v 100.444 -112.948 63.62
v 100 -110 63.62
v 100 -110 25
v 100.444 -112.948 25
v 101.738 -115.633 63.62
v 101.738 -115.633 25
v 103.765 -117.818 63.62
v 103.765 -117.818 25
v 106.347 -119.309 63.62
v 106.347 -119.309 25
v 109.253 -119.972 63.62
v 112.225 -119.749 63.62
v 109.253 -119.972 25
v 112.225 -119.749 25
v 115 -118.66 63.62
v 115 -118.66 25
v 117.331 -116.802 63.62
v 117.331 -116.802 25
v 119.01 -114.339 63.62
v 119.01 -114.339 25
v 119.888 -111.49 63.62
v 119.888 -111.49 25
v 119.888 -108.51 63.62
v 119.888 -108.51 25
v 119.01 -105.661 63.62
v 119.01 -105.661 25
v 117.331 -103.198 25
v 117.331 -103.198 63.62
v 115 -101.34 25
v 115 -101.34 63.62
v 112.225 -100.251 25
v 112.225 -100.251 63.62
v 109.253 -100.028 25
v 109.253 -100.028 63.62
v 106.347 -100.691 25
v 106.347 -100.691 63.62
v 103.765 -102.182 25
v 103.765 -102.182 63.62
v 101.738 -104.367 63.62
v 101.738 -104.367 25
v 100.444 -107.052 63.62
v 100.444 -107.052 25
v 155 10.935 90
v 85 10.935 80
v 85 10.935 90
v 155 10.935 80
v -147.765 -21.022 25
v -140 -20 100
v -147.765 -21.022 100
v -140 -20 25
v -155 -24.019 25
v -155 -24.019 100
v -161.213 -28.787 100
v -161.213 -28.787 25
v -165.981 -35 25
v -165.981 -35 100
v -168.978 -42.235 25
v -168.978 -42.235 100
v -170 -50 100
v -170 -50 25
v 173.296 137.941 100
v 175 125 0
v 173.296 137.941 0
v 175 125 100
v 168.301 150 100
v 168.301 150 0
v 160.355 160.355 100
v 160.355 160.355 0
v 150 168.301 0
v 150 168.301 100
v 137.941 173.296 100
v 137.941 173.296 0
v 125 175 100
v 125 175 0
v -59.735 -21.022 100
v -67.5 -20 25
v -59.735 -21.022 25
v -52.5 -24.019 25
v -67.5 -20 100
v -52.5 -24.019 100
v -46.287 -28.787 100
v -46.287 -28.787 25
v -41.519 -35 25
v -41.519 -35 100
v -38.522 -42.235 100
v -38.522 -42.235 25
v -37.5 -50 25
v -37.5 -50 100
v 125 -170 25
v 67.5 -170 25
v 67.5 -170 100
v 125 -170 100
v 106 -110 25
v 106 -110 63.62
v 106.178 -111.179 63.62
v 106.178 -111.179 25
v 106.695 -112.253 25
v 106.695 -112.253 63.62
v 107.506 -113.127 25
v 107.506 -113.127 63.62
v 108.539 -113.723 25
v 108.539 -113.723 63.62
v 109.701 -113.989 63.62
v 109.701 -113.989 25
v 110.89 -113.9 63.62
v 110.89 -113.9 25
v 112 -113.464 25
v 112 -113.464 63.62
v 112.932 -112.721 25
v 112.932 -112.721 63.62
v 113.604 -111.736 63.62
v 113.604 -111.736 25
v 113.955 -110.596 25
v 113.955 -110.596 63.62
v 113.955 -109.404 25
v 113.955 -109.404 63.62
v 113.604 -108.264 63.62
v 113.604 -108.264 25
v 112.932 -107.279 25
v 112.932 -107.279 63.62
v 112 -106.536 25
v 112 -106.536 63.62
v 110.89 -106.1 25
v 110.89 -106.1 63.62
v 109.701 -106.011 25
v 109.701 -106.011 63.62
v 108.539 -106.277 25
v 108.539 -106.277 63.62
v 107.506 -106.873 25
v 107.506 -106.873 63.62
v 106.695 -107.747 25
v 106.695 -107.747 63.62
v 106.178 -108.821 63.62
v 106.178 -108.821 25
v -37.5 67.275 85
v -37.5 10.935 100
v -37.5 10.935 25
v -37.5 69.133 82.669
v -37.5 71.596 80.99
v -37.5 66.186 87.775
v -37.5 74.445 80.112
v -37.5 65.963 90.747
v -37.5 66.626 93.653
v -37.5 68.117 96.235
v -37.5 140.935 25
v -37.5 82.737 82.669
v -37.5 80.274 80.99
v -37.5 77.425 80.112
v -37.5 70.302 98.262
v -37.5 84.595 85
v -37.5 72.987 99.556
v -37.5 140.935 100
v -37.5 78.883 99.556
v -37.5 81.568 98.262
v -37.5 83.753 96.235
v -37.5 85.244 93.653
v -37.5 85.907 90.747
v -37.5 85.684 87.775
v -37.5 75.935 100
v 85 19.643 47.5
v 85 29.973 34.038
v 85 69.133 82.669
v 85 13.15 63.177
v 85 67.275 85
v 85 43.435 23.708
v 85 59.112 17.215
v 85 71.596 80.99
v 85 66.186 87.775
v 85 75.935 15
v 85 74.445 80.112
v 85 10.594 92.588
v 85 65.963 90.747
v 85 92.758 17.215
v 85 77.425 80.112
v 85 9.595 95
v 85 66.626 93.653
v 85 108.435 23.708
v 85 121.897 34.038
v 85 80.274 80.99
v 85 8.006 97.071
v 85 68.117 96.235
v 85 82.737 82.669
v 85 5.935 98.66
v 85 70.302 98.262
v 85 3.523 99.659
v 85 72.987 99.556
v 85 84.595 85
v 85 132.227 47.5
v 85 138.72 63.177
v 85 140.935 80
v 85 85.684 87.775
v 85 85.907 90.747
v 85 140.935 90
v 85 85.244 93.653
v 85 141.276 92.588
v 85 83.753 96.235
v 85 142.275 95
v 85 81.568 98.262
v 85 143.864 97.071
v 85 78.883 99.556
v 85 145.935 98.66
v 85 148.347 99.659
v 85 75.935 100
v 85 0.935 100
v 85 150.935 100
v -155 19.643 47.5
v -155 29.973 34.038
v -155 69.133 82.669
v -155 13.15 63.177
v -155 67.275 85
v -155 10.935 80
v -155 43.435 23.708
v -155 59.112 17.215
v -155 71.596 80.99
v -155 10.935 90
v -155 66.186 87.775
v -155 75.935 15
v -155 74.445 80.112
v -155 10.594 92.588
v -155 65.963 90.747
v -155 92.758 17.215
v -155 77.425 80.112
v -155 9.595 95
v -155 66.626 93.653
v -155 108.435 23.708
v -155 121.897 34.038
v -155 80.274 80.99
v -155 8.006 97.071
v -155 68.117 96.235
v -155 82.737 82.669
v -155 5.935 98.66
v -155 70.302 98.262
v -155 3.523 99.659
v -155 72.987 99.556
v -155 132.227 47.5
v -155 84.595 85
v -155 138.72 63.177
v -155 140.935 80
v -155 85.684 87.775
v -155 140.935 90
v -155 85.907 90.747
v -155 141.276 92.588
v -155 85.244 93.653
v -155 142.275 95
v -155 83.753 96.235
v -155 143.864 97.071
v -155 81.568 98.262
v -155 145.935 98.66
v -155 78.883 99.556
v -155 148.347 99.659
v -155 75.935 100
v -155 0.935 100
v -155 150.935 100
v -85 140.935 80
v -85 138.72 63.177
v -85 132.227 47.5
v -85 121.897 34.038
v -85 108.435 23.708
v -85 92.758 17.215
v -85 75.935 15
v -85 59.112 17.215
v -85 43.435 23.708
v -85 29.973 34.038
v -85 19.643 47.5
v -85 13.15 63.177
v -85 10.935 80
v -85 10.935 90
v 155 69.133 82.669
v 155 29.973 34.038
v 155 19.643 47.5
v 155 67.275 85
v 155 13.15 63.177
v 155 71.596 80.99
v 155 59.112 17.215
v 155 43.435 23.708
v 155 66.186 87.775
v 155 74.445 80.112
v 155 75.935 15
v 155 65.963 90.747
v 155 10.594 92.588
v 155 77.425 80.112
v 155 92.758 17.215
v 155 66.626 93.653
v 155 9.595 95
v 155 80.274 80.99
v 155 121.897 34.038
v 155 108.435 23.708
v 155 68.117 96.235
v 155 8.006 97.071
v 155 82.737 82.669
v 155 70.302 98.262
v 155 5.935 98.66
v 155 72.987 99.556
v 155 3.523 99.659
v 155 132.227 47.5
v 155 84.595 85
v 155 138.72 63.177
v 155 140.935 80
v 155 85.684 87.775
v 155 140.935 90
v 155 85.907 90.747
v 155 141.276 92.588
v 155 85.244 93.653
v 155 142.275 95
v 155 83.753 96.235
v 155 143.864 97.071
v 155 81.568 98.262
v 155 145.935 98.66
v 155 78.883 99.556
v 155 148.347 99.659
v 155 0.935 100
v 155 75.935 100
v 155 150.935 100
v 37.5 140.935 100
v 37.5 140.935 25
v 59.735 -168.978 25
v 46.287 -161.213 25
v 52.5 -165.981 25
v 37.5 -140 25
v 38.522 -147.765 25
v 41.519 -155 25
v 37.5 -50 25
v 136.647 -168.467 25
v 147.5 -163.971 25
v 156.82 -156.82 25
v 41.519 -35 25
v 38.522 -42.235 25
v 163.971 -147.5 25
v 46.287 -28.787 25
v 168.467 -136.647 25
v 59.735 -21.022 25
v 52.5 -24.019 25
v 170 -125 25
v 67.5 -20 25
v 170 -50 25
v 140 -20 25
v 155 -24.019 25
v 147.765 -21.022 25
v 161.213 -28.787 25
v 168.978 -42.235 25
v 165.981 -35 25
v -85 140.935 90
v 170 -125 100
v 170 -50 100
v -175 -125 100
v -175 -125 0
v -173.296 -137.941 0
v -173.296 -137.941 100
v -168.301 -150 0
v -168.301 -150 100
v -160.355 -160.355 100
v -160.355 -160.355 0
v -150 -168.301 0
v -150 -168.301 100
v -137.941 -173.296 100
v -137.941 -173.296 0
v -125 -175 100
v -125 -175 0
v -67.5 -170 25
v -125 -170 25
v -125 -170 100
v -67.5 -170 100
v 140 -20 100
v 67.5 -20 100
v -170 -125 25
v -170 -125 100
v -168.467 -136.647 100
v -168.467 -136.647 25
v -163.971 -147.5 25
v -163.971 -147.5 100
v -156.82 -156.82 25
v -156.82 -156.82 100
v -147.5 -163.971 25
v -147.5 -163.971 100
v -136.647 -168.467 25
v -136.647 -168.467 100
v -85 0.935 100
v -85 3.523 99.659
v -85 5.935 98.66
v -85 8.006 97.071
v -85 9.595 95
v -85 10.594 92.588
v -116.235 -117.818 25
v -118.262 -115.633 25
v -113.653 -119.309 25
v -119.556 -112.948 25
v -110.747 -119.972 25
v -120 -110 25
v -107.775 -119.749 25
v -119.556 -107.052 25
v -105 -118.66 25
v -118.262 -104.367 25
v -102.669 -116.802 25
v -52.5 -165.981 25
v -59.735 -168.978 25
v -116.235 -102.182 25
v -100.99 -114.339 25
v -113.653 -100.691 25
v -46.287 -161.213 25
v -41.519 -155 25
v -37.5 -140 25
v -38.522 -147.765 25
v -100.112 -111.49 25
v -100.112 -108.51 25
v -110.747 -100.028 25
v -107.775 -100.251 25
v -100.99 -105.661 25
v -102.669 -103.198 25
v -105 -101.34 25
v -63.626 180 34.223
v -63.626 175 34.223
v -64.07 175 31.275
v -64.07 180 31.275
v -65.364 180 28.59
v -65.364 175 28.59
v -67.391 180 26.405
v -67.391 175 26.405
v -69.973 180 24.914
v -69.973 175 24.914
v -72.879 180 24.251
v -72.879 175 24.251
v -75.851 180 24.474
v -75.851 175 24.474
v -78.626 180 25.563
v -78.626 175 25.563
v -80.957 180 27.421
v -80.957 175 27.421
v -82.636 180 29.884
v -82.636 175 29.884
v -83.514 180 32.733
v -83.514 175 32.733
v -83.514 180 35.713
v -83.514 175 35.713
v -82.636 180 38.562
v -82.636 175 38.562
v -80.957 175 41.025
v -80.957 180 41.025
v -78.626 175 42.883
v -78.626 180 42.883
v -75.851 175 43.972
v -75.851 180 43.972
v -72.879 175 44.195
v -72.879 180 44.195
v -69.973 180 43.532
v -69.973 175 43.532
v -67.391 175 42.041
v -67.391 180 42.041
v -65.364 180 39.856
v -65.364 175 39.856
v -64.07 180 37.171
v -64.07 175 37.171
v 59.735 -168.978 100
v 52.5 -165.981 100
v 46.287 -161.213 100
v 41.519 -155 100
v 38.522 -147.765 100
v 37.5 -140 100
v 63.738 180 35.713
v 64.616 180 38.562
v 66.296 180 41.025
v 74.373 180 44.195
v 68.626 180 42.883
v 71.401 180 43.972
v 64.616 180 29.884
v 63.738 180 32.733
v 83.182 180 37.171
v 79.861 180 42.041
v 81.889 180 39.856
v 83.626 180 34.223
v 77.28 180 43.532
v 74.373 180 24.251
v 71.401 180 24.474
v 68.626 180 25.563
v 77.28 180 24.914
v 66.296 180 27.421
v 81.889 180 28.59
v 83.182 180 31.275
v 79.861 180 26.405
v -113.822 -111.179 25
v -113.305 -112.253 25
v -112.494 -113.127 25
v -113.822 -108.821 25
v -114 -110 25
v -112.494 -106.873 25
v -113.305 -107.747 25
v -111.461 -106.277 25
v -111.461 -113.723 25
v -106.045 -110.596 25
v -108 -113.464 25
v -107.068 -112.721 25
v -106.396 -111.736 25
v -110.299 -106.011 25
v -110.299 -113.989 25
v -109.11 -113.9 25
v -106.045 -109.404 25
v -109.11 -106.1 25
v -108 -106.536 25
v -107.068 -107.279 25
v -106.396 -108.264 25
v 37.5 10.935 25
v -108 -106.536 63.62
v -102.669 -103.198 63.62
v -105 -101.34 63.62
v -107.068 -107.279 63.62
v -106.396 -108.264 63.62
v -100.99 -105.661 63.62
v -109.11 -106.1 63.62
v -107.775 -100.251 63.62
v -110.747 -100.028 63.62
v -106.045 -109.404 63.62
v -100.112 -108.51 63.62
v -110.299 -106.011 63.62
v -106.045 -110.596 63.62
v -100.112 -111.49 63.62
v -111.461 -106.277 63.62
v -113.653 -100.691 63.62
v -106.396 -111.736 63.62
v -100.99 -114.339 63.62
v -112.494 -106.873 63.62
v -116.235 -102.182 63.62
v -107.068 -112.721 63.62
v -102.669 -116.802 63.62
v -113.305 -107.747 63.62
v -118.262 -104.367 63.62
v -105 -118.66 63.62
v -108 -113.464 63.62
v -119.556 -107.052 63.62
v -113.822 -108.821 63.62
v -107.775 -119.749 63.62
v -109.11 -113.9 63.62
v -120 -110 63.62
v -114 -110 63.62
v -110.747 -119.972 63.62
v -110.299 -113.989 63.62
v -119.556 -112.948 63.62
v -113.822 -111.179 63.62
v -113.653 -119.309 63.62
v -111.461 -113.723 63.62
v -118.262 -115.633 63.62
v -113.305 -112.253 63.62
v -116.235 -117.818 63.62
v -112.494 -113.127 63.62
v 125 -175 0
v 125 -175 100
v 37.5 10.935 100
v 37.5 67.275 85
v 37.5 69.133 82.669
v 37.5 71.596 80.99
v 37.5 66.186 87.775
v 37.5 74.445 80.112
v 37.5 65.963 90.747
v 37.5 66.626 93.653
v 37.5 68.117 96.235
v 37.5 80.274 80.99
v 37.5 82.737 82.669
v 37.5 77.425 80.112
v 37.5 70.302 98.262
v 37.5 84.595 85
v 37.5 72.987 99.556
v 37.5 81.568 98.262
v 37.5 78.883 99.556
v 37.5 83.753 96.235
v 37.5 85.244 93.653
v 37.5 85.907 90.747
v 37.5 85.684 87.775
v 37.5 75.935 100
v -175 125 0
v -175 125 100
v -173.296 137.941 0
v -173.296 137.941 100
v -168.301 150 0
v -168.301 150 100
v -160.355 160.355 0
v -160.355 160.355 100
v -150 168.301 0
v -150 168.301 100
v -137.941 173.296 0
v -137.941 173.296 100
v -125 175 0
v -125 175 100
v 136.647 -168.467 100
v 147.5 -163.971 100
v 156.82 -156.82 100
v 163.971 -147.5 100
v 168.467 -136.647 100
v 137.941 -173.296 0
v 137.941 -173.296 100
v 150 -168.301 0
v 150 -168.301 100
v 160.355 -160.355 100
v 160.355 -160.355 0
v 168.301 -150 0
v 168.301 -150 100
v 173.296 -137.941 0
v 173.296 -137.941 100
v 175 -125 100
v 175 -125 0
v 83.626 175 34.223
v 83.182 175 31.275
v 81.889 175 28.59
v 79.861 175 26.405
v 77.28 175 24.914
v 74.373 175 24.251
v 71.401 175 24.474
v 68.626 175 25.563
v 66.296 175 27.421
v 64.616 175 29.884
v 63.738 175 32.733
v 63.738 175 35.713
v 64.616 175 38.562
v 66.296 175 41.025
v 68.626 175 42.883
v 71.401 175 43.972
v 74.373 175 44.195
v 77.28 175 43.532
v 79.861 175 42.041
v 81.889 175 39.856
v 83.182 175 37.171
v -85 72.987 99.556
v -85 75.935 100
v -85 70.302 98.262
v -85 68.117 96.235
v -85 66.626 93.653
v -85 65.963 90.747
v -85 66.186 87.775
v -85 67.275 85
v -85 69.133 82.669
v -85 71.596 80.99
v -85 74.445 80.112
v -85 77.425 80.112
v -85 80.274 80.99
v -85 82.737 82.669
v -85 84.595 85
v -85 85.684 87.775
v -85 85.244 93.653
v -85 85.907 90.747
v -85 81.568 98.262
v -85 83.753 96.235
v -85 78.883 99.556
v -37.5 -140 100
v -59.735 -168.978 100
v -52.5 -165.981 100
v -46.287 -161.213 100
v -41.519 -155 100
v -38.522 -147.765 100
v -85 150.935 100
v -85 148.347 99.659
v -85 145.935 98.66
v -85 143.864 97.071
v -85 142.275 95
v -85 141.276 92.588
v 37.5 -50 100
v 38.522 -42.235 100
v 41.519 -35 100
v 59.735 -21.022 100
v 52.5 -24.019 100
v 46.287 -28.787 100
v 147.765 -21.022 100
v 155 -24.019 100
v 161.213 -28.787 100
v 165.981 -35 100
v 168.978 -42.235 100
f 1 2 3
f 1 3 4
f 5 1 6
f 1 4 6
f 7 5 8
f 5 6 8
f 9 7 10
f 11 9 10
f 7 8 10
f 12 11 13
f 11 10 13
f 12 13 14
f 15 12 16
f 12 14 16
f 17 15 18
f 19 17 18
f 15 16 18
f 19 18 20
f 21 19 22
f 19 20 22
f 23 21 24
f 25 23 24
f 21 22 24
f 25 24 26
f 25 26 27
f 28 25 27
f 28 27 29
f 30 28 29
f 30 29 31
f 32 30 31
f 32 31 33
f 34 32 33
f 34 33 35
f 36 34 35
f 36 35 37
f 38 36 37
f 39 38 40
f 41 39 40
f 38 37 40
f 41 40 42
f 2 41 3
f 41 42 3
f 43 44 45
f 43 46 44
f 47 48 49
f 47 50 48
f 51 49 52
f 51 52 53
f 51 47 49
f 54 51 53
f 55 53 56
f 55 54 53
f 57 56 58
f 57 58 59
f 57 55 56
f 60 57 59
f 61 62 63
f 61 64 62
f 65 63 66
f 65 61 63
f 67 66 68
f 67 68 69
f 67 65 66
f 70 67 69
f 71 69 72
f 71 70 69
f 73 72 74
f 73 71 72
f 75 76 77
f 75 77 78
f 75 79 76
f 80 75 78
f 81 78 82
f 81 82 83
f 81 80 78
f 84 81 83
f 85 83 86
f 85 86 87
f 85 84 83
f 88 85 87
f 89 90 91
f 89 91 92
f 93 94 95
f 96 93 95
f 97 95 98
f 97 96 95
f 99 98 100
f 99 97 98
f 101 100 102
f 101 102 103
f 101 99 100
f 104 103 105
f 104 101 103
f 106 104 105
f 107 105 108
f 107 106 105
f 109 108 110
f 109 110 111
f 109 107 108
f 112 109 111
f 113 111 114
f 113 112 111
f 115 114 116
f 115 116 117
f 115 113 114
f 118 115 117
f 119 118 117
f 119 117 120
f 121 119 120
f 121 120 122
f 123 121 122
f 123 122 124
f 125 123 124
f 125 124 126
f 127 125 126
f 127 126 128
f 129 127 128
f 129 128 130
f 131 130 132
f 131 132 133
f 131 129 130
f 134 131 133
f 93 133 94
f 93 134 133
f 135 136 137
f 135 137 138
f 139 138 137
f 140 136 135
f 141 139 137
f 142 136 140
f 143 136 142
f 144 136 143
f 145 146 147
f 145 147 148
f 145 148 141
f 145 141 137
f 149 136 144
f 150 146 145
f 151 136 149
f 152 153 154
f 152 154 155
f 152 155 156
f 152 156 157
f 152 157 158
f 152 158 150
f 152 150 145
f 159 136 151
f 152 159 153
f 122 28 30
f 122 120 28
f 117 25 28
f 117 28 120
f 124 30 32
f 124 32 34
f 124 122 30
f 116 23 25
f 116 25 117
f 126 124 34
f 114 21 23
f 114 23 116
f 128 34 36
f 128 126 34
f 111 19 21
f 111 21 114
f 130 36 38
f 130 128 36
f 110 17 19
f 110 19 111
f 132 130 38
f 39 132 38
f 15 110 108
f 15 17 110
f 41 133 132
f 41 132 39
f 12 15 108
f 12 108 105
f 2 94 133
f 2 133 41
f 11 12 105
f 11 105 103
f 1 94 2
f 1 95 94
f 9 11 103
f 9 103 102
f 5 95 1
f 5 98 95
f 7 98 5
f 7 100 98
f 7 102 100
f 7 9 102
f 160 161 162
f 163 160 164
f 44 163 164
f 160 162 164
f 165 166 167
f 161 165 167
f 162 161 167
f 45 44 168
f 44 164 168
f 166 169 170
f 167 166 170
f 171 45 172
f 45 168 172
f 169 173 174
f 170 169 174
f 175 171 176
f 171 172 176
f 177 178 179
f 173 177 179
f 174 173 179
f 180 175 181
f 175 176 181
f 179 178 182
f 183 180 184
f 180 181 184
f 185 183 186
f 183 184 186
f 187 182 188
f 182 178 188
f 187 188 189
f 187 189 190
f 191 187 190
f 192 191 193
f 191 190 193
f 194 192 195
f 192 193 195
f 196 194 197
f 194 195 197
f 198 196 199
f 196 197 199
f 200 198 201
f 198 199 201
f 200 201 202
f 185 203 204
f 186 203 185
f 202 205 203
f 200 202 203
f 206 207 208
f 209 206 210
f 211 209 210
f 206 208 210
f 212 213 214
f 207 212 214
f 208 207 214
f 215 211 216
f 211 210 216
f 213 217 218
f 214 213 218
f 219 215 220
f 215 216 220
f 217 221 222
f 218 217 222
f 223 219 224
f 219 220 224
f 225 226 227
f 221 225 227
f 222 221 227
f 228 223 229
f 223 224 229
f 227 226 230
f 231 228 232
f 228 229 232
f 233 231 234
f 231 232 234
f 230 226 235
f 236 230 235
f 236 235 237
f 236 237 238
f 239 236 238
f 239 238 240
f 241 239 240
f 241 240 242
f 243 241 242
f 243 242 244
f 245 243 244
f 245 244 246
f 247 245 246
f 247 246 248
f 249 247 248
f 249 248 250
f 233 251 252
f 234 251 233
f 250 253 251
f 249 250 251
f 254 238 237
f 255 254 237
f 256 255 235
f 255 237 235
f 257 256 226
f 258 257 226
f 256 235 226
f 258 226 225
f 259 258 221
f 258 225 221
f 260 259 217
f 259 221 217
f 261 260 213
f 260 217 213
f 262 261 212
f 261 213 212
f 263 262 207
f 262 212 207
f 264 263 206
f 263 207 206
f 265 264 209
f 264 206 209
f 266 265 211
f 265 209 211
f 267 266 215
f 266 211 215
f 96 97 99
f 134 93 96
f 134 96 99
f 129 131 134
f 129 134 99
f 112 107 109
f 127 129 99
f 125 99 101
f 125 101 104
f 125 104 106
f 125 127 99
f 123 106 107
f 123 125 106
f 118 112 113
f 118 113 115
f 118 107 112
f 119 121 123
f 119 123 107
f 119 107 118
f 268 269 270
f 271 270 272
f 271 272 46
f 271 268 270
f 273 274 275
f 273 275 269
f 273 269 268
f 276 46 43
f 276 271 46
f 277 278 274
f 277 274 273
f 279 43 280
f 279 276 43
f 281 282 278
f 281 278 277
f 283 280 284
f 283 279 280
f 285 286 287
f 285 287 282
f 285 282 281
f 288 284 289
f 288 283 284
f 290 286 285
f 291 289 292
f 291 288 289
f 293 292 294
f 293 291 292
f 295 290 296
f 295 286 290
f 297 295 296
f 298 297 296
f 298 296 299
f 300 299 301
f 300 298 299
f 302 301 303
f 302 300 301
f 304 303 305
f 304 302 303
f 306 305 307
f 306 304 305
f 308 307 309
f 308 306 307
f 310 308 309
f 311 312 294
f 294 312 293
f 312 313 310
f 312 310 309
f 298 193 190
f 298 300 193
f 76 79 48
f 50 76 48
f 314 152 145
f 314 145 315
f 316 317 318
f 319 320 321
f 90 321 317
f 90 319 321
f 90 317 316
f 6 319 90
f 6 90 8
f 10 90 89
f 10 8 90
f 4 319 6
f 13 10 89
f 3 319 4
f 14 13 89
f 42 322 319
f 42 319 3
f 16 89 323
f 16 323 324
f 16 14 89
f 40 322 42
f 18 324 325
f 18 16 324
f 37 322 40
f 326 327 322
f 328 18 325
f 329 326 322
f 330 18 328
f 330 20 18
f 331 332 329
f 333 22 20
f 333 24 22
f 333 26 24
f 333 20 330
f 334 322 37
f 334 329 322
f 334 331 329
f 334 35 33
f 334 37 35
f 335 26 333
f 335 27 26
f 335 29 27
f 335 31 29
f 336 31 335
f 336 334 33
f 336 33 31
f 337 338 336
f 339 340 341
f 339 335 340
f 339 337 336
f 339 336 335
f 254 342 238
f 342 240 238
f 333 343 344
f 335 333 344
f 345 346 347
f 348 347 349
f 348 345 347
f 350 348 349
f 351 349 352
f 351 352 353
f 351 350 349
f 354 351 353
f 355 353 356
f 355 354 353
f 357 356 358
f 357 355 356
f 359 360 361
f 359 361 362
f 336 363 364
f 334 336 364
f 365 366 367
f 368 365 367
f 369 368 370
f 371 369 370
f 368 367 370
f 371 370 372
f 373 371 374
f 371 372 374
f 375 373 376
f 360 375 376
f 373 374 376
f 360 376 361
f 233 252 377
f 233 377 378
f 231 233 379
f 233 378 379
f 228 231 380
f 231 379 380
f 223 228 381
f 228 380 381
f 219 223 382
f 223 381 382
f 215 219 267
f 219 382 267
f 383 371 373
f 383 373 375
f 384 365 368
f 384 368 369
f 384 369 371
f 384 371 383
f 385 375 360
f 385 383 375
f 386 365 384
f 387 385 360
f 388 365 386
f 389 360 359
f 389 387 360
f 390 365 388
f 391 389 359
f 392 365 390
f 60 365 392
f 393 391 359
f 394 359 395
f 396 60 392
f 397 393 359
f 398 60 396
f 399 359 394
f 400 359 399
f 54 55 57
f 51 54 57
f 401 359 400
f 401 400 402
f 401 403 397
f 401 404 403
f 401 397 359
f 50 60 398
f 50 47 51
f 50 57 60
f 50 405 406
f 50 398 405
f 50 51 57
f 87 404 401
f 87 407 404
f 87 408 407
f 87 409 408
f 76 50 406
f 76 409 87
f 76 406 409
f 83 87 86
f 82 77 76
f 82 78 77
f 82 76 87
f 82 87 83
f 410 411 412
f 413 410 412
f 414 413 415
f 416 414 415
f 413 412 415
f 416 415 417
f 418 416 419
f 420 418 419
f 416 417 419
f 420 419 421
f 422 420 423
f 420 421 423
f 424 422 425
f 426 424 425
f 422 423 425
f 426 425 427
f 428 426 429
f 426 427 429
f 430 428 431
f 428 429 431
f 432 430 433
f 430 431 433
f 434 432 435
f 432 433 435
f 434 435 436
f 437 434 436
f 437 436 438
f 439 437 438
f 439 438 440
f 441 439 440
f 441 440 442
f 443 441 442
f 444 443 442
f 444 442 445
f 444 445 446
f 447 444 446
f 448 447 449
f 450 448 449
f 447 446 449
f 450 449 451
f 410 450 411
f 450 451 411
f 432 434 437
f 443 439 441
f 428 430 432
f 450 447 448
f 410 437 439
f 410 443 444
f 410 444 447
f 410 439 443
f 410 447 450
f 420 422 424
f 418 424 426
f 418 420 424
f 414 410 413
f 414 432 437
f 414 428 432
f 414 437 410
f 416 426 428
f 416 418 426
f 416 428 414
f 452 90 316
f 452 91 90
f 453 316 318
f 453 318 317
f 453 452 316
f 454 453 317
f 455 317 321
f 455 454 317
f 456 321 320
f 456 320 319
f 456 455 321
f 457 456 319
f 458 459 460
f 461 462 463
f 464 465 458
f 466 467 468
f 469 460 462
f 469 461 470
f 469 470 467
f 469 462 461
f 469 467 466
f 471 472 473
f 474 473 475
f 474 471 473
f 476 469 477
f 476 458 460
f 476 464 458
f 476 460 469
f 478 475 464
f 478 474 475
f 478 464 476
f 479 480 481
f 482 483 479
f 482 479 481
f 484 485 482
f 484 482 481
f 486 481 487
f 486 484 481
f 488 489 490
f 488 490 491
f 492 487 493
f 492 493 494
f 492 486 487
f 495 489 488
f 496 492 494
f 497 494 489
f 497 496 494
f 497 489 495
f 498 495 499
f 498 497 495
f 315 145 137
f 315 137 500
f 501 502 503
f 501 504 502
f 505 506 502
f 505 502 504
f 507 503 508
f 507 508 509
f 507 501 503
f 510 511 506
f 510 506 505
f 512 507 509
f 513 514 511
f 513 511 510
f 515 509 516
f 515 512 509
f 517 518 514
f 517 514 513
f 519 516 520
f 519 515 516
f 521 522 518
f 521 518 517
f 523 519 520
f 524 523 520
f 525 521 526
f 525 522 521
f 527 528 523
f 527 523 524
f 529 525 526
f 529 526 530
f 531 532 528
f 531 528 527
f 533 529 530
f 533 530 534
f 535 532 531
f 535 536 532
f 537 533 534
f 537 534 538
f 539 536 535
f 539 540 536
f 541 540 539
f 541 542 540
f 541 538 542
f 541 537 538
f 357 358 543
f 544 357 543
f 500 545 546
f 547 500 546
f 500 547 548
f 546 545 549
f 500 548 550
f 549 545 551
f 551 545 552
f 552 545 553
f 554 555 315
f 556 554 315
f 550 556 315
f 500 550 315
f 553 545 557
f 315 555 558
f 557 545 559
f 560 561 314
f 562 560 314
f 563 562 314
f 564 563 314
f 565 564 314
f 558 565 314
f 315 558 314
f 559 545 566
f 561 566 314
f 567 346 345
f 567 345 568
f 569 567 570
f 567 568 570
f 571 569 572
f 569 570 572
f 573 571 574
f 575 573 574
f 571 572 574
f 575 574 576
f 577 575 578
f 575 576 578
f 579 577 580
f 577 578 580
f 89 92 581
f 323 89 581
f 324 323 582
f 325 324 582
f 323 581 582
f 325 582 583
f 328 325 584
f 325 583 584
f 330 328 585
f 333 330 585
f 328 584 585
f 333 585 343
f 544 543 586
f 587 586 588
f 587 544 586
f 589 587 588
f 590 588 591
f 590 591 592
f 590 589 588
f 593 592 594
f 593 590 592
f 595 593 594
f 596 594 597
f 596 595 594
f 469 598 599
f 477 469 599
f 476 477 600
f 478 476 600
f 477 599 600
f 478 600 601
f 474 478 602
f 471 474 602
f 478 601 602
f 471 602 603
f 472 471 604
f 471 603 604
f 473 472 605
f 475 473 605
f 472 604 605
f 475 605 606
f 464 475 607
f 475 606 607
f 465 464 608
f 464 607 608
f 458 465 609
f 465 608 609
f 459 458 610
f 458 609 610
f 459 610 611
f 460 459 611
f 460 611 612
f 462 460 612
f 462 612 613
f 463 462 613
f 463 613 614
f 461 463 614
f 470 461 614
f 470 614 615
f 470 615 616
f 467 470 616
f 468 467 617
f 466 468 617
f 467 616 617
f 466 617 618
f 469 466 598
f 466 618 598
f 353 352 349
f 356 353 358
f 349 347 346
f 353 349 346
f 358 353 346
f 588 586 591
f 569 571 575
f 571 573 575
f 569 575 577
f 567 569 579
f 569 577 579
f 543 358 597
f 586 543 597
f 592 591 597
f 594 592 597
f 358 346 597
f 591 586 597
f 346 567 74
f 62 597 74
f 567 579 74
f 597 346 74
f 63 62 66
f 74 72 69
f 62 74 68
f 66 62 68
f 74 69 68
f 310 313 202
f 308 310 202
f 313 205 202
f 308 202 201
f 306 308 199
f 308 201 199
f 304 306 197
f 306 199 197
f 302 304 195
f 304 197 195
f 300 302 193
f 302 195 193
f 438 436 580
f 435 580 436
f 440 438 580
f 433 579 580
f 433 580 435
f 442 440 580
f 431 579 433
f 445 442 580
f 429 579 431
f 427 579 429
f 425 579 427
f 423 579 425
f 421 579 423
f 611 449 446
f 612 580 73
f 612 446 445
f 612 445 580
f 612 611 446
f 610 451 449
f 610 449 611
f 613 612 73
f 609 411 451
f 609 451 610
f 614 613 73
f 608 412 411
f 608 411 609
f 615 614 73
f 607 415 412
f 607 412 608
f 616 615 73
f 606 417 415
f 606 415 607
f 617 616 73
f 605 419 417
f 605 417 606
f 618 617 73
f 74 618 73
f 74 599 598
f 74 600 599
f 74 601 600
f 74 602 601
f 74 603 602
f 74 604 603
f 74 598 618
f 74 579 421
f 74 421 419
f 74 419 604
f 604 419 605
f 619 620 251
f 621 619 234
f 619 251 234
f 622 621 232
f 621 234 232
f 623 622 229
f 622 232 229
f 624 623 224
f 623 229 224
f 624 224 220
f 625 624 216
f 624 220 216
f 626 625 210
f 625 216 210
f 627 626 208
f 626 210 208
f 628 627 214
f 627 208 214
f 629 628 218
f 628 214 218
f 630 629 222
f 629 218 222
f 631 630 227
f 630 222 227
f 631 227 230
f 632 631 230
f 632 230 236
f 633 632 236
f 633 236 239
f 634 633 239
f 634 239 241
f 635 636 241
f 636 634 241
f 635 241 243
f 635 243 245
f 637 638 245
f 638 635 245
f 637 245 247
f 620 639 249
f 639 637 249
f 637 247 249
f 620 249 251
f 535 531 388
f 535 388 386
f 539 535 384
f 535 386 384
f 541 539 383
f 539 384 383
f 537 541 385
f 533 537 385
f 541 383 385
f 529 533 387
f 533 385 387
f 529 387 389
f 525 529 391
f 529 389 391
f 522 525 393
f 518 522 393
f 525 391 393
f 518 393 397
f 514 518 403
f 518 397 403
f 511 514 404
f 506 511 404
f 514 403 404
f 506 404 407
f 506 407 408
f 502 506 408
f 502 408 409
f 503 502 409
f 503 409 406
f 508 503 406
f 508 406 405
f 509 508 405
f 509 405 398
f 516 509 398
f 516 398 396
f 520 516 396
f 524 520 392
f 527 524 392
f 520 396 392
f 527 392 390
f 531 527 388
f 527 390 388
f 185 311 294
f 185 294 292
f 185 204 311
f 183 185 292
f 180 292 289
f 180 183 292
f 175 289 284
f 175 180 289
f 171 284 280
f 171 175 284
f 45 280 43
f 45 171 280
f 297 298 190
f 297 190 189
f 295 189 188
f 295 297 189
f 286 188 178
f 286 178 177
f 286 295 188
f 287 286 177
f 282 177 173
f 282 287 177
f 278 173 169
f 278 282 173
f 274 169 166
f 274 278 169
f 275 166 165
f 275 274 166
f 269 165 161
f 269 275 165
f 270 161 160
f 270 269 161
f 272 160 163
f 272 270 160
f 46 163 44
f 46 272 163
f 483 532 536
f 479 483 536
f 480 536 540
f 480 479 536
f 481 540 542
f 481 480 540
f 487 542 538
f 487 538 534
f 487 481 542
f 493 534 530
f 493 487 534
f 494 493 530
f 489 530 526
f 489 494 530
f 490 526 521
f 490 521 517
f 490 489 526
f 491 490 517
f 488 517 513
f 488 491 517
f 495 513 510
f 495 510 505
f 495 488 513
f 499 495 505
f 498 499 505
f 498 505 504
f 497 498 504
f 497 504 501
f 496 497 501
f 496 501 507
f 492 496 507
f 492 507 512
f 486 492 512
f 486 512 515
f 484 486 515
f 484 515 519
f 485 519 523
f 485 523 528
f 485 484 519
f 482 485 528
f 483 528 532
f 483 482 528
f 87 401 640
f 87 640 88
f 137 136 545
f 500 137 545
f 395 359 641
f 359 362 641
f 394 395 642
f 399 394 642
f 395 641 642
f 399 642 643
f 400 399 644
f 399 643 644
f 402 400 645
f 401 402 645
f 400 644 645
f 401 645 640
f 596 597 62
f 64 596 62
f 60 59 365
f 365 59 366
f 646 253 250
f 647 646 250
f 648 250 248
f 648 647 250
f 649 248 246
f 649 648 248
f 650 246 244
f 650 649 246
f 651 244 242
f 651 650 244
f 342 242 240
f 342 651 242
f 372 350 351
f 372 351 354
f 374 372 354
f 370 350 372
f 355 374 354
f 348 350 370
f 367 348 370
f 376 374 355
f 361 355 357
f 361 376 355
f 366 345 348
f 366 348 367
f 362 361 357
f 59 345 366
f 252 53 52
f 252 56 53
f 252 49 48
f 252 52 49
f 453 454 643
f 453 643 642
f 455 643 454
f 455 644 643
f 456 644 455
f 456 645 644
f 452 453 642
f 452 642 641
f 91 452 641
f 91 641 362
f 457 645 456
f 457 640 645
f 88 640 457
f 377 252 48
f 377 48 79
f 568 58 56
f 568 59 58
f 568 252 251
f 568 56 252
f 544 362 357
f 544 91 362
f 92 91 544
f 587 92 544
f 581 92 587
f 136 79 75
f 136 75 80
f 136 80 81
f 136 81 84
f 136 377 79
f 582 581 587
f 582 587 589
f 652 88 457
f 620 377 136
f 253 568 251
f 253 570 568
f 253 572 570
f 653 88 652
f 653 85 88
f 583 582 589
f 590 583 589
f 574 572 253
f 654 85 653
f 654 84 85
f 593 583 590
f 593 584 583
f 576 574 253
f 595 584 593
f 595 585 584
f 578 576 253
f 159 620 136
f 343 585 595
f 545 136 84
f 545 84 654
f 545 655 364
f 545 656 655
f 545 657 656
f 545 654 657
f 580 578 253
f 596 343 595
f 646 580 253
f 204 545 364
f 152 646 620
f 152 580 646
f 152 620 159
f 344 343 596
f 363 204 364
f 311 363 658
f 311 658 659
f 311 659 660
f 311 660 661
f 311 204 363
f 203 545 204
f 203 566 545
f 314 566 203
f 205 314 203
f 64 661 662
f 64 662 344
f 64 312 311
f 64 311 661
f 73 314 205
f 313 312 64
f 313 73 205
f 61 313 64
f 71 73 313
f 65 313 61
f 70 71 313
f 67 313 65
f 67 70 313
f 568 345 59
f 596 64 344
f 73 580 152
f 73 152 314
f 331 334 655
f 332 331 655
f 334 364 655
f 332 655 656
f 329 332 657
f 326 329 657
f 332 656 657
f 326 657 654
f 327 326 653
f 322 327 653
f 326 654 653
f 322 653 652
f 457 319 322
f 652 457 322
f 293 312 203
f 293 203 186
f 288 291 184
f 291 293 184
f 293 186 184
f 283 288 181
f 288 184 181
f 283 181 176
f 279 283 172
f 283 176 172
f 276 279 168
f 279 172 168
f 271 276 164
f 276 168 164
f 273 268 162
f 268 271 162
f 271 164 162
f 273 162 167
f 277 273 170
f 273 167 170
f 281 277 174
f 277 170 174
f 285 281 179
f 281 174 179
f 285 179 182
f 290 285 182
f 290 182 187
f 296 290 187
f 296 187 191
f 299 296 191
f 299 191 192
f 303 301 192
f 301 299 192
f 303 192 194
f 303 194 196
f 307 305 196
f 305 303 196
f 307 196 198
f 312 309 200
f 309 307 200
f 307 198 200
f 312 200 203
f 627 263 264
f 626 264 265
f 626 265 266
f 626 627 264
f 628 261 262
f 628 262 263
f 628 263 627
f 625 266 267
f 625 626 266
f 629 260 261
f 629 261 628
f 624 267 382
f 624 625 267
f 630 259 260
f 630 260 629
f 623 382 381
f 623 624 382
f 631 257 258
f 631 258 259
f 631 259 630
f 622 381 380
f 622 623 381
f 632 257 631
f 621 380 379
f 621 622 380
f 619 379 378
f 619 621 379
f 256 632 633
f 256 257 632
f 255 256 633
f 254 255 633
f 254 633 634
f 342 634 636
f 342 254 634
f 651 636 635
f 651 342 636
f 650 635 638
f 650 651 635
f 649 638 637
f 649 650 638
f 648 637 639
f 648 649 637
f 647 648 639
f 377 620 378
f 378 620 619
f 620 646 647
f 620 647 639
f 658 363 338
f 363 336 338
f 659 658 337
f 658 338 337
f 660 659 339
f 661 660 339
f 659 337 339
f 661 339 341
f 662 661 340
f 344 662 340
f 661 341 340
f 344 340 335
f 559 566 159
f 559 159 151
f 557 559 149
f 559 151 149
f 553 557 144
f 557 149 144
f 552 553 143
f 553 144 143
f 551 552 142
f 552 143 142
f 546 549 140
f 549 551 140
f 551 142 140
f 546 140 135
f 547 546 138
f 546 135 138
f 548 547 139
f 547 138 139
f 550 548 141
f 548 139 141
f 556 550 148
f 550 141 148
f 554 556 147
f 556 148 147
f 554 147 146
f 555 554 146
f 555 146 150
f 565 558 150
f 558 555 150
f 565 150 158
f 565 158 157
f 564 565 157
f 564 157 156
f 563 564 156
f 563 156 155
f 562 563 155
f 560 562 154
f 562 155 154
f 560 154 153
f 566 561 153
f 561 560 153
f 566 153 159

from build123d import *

# Parameters (mm, degrees)
SKETCH_1_W          = 350
SKETCH_1_H          = 350
EXTRUDE_1_DEPTH     = 100
FILLET_1_R          = 50
CUT_EXTRUDE_1_DEPTH = 35
SKETCH_4_W          = 75
SKETCH_4_H          = 130
CUT_EXTRUDE_2_DEPTH = 75
EXTRUDE_3_REACH     = 388.685
SKETCH_5_R          = 10
FILLET_2_R          = 10
CUT_EXTRUDE_3_DEPTH = 75
SKETCH_7_R          = 10
SKETCH_7_R_2        = 4
EXTRUDE_4_DEPTH     = 38.62
SKETCH_8_W          = 75
SKETCH_8_H          = 150
EXTRUDE_5_DEPTH     = 75
FILLET_3_R          = 30
SKETCH_9_R          = 10
EXTRUDE_6_DEPTH     = 5


with BuildPart() as part:
    # 草图1 → 凸台-拉伸1 (new body)
    with BuildSketch(Plane.XY):
        Rectangle(SKETCH_1_W, SKETCH_1_H)
    extrude(amount=EXTRUDE_1_DEPTH)

    # 圆角1
    fillet_1_edges = [part.edges().sort_by_distance(p)[0] for p in [
        (-175, 175, 50),
        (175, 175, 50),
        (175, -175, 50),
        (-175, -175, 50),
    ]]
    fillet(fillet_1_edges, radius=FILLET_1_R)

    # 草图3 → 切除-拉伸1 (cut, symmetric)
    with BuildSketch(Plane.ZY.offset(120)):
        with BuildLine():
            Line((15, 75.934955472), (100, 75.934955472))
            Line((100, 75.934955472), (100, 140.934955472))
            Line((100, 140.934955472), (80, 140.934955472))
            ThreePointArc((80, 140.934955472), (34.038059223, 121.896896249), (15, 75.934955472))
        make_face()
        with BuildLine():
            Line((100, 10.934955472), (100, 75.934955472))
            Line((100, 75.934955472), (15, 75.934955472))
            ThreePointArc((15, 75.934955472), (34.038059223, 29.973014695), (80, 10.934955472))
            Line((80, 10.934955472), (100, 10.934955472))
        make_face()
    cut_extrude_1 = extrude(amount=CUT_EXTRUDE_1_DEPTH, both=True, mode=Mode.SUBTRACT)

    # 镜向1: 切除-拉伸1 across plane
    add(cut_extrude_1.mirror(Plane(origin=(0, 0, 0), x_dir=(0, 0, 1), z_dir=(1, 0, 0))), mode=Mode.SUBTRACT)

    # 草图4 → 切除-拉伸2 (cut)
    with BuildSketch(Plane.XY.offset(100)):
        with Locations((0, 75.934955472)):
            Rectangle(SKETCH_4_W, SKETCH_4_H)
    extrude(amount=-CUT_EXTRUDE_2_DEPTH, mode=Mode.SUBTRACT)

    # 凸台-拉伸3: up to this face of the body (flat: up to its plane)
    extrude_3_end = Plane(part.part.faces().sort_by_distance((155, 75.934955472, 62.993408065))[0])
    # 草图5 → 凸台-拉伸3 (add, up to the picked face)
    with BuildSketch(Plane(origin=(-155, 0, 0), x_dir=(0, 0, -1), z_dir=(1, 0, 0)), mode=Mode.PRIVATE) as extrude_3_sk1:
        with Locations(Location((-90, 75.934955472, 0), (0, 0, 180))):
            Circle(SKETCH_5_R)
    extrude_3_tool1 = split(extrude(extrude_3_sk1.sketch, amount=EXTRUDE_3_REACH, mode=Mode.PRIVATE), bisect_by=extrude_3_end, keep=Keep.BOTH, mode=Mode.PRIVATE)
    add(extrude_3_tool1.solids().sort_by(Axis((-155, 75.934955, 90), (1, 0, 0)))[0])

    # 圆角2
    fillet_2_edges = [part.edges().sort_by_distance(p)[0] for p in [
        (-120, 10.934955472, 100),
        (-120, 140.934955472, 100),
        (120, 140.934955472, 100),
        (120, 10.934955472, 100),
    ]]
    fillet(fillet_2_edges, radius=FILLET_2_R)

    # 草图6 → 切除-拉伸3 (cut)
    with BuildSketch(Plane.XY.offset(100)):
        with BuildLine():
            Line((170, -20), (0, -20))
            Line((0, -20), (0, -170))
            Line((0, -170), (125, -170))
            ThreePointArc((125, -170), (156.819805153, -156.819805153), (170, -125))
            Line((170, -125), (170, -20))
        make_face()
        with BuildLine():
            Line((0, -170), (0, -20))
            Line((0, -20), (-170, -20))
            Line((-170, -20), (-170, -125))
            ThreePointArc((-170, -125), (-156.819805153, -156.819805153), (-125, -170))
            Line((-125, -170), (0, -170))
        make_face()
    extrude(amount=-CUT_EXTRUDE_3_DEPTH, mode=Mode.SUBTRACT)

    # 草图7 → 凸台-拉伸4 (add)
    # profile 1 of 2: a face of its own
    with BuildSketch(Plane.XY.offset(25)):
        with Locations(Location((110, -110, 0), (0, 0, 180))):
            Circle(SKETCH_7_R)
        with Locations(Location((110, -110, 0), (0, 0, 180))):
            Circle(SKETCH_7_R_2, mode=Mode.SUBTRACT)
    # profile 2 of 2: a face of its own
    with BuildSketch(Plane.XY.offset(25)):
        with Locations(Location((-110, -110, 0), (0, 0, 180))):
            Circle(SKETCH_7_R)
        with Locations(Location((-110, -110, 0), (0, 0, 180))):
            Circle(SKETCH_7_R_2, mode=Mode.SUBTRACT)
    extrude(amount=EXTRUDE_4_DEPTH)

    # 草图8 → 凸台-拉伸5 (add)
    with BuildSketch(Plane.XY.offset(25)):
        with Locations((0, -95)):
            Rectangle(SKETCH_8_W, SKETCH_8_H)
    extrude(amount=EXTRUDE_5_DEPTH)

    # 圆角3
    fillet_3_edges = [part.edges().sort_by_distance(p)[0] for p in [
        (-170, -20, 62.5),
        (170, -20, 62.5),
        (-37.5, -170, 62.5),
        (37.5, -170, 62.5),
        (37.5, -20, 62.5),
        (-37.5, -20, 62.5),
    ]]
    fillet(fillet_3_edges, radius=FILLET_3_R)

    # 草图9 → 凸台-拉伸6 (add)
    with BuildSketch(Plane(origin=(0, 175, 0), x_dir=(1, 0, 0), z_dir=(0, 1, 0))):
        with Locations((-73.626122366, -34.222973779)):
            Circle(SKETCH_9_R)
        with Locations((73.626122366, -34.222973779)):
            Circle(SKETCH_9_R)
    extrude(amount=EXTRUDE_6_DEPTH)


solid = part.part
